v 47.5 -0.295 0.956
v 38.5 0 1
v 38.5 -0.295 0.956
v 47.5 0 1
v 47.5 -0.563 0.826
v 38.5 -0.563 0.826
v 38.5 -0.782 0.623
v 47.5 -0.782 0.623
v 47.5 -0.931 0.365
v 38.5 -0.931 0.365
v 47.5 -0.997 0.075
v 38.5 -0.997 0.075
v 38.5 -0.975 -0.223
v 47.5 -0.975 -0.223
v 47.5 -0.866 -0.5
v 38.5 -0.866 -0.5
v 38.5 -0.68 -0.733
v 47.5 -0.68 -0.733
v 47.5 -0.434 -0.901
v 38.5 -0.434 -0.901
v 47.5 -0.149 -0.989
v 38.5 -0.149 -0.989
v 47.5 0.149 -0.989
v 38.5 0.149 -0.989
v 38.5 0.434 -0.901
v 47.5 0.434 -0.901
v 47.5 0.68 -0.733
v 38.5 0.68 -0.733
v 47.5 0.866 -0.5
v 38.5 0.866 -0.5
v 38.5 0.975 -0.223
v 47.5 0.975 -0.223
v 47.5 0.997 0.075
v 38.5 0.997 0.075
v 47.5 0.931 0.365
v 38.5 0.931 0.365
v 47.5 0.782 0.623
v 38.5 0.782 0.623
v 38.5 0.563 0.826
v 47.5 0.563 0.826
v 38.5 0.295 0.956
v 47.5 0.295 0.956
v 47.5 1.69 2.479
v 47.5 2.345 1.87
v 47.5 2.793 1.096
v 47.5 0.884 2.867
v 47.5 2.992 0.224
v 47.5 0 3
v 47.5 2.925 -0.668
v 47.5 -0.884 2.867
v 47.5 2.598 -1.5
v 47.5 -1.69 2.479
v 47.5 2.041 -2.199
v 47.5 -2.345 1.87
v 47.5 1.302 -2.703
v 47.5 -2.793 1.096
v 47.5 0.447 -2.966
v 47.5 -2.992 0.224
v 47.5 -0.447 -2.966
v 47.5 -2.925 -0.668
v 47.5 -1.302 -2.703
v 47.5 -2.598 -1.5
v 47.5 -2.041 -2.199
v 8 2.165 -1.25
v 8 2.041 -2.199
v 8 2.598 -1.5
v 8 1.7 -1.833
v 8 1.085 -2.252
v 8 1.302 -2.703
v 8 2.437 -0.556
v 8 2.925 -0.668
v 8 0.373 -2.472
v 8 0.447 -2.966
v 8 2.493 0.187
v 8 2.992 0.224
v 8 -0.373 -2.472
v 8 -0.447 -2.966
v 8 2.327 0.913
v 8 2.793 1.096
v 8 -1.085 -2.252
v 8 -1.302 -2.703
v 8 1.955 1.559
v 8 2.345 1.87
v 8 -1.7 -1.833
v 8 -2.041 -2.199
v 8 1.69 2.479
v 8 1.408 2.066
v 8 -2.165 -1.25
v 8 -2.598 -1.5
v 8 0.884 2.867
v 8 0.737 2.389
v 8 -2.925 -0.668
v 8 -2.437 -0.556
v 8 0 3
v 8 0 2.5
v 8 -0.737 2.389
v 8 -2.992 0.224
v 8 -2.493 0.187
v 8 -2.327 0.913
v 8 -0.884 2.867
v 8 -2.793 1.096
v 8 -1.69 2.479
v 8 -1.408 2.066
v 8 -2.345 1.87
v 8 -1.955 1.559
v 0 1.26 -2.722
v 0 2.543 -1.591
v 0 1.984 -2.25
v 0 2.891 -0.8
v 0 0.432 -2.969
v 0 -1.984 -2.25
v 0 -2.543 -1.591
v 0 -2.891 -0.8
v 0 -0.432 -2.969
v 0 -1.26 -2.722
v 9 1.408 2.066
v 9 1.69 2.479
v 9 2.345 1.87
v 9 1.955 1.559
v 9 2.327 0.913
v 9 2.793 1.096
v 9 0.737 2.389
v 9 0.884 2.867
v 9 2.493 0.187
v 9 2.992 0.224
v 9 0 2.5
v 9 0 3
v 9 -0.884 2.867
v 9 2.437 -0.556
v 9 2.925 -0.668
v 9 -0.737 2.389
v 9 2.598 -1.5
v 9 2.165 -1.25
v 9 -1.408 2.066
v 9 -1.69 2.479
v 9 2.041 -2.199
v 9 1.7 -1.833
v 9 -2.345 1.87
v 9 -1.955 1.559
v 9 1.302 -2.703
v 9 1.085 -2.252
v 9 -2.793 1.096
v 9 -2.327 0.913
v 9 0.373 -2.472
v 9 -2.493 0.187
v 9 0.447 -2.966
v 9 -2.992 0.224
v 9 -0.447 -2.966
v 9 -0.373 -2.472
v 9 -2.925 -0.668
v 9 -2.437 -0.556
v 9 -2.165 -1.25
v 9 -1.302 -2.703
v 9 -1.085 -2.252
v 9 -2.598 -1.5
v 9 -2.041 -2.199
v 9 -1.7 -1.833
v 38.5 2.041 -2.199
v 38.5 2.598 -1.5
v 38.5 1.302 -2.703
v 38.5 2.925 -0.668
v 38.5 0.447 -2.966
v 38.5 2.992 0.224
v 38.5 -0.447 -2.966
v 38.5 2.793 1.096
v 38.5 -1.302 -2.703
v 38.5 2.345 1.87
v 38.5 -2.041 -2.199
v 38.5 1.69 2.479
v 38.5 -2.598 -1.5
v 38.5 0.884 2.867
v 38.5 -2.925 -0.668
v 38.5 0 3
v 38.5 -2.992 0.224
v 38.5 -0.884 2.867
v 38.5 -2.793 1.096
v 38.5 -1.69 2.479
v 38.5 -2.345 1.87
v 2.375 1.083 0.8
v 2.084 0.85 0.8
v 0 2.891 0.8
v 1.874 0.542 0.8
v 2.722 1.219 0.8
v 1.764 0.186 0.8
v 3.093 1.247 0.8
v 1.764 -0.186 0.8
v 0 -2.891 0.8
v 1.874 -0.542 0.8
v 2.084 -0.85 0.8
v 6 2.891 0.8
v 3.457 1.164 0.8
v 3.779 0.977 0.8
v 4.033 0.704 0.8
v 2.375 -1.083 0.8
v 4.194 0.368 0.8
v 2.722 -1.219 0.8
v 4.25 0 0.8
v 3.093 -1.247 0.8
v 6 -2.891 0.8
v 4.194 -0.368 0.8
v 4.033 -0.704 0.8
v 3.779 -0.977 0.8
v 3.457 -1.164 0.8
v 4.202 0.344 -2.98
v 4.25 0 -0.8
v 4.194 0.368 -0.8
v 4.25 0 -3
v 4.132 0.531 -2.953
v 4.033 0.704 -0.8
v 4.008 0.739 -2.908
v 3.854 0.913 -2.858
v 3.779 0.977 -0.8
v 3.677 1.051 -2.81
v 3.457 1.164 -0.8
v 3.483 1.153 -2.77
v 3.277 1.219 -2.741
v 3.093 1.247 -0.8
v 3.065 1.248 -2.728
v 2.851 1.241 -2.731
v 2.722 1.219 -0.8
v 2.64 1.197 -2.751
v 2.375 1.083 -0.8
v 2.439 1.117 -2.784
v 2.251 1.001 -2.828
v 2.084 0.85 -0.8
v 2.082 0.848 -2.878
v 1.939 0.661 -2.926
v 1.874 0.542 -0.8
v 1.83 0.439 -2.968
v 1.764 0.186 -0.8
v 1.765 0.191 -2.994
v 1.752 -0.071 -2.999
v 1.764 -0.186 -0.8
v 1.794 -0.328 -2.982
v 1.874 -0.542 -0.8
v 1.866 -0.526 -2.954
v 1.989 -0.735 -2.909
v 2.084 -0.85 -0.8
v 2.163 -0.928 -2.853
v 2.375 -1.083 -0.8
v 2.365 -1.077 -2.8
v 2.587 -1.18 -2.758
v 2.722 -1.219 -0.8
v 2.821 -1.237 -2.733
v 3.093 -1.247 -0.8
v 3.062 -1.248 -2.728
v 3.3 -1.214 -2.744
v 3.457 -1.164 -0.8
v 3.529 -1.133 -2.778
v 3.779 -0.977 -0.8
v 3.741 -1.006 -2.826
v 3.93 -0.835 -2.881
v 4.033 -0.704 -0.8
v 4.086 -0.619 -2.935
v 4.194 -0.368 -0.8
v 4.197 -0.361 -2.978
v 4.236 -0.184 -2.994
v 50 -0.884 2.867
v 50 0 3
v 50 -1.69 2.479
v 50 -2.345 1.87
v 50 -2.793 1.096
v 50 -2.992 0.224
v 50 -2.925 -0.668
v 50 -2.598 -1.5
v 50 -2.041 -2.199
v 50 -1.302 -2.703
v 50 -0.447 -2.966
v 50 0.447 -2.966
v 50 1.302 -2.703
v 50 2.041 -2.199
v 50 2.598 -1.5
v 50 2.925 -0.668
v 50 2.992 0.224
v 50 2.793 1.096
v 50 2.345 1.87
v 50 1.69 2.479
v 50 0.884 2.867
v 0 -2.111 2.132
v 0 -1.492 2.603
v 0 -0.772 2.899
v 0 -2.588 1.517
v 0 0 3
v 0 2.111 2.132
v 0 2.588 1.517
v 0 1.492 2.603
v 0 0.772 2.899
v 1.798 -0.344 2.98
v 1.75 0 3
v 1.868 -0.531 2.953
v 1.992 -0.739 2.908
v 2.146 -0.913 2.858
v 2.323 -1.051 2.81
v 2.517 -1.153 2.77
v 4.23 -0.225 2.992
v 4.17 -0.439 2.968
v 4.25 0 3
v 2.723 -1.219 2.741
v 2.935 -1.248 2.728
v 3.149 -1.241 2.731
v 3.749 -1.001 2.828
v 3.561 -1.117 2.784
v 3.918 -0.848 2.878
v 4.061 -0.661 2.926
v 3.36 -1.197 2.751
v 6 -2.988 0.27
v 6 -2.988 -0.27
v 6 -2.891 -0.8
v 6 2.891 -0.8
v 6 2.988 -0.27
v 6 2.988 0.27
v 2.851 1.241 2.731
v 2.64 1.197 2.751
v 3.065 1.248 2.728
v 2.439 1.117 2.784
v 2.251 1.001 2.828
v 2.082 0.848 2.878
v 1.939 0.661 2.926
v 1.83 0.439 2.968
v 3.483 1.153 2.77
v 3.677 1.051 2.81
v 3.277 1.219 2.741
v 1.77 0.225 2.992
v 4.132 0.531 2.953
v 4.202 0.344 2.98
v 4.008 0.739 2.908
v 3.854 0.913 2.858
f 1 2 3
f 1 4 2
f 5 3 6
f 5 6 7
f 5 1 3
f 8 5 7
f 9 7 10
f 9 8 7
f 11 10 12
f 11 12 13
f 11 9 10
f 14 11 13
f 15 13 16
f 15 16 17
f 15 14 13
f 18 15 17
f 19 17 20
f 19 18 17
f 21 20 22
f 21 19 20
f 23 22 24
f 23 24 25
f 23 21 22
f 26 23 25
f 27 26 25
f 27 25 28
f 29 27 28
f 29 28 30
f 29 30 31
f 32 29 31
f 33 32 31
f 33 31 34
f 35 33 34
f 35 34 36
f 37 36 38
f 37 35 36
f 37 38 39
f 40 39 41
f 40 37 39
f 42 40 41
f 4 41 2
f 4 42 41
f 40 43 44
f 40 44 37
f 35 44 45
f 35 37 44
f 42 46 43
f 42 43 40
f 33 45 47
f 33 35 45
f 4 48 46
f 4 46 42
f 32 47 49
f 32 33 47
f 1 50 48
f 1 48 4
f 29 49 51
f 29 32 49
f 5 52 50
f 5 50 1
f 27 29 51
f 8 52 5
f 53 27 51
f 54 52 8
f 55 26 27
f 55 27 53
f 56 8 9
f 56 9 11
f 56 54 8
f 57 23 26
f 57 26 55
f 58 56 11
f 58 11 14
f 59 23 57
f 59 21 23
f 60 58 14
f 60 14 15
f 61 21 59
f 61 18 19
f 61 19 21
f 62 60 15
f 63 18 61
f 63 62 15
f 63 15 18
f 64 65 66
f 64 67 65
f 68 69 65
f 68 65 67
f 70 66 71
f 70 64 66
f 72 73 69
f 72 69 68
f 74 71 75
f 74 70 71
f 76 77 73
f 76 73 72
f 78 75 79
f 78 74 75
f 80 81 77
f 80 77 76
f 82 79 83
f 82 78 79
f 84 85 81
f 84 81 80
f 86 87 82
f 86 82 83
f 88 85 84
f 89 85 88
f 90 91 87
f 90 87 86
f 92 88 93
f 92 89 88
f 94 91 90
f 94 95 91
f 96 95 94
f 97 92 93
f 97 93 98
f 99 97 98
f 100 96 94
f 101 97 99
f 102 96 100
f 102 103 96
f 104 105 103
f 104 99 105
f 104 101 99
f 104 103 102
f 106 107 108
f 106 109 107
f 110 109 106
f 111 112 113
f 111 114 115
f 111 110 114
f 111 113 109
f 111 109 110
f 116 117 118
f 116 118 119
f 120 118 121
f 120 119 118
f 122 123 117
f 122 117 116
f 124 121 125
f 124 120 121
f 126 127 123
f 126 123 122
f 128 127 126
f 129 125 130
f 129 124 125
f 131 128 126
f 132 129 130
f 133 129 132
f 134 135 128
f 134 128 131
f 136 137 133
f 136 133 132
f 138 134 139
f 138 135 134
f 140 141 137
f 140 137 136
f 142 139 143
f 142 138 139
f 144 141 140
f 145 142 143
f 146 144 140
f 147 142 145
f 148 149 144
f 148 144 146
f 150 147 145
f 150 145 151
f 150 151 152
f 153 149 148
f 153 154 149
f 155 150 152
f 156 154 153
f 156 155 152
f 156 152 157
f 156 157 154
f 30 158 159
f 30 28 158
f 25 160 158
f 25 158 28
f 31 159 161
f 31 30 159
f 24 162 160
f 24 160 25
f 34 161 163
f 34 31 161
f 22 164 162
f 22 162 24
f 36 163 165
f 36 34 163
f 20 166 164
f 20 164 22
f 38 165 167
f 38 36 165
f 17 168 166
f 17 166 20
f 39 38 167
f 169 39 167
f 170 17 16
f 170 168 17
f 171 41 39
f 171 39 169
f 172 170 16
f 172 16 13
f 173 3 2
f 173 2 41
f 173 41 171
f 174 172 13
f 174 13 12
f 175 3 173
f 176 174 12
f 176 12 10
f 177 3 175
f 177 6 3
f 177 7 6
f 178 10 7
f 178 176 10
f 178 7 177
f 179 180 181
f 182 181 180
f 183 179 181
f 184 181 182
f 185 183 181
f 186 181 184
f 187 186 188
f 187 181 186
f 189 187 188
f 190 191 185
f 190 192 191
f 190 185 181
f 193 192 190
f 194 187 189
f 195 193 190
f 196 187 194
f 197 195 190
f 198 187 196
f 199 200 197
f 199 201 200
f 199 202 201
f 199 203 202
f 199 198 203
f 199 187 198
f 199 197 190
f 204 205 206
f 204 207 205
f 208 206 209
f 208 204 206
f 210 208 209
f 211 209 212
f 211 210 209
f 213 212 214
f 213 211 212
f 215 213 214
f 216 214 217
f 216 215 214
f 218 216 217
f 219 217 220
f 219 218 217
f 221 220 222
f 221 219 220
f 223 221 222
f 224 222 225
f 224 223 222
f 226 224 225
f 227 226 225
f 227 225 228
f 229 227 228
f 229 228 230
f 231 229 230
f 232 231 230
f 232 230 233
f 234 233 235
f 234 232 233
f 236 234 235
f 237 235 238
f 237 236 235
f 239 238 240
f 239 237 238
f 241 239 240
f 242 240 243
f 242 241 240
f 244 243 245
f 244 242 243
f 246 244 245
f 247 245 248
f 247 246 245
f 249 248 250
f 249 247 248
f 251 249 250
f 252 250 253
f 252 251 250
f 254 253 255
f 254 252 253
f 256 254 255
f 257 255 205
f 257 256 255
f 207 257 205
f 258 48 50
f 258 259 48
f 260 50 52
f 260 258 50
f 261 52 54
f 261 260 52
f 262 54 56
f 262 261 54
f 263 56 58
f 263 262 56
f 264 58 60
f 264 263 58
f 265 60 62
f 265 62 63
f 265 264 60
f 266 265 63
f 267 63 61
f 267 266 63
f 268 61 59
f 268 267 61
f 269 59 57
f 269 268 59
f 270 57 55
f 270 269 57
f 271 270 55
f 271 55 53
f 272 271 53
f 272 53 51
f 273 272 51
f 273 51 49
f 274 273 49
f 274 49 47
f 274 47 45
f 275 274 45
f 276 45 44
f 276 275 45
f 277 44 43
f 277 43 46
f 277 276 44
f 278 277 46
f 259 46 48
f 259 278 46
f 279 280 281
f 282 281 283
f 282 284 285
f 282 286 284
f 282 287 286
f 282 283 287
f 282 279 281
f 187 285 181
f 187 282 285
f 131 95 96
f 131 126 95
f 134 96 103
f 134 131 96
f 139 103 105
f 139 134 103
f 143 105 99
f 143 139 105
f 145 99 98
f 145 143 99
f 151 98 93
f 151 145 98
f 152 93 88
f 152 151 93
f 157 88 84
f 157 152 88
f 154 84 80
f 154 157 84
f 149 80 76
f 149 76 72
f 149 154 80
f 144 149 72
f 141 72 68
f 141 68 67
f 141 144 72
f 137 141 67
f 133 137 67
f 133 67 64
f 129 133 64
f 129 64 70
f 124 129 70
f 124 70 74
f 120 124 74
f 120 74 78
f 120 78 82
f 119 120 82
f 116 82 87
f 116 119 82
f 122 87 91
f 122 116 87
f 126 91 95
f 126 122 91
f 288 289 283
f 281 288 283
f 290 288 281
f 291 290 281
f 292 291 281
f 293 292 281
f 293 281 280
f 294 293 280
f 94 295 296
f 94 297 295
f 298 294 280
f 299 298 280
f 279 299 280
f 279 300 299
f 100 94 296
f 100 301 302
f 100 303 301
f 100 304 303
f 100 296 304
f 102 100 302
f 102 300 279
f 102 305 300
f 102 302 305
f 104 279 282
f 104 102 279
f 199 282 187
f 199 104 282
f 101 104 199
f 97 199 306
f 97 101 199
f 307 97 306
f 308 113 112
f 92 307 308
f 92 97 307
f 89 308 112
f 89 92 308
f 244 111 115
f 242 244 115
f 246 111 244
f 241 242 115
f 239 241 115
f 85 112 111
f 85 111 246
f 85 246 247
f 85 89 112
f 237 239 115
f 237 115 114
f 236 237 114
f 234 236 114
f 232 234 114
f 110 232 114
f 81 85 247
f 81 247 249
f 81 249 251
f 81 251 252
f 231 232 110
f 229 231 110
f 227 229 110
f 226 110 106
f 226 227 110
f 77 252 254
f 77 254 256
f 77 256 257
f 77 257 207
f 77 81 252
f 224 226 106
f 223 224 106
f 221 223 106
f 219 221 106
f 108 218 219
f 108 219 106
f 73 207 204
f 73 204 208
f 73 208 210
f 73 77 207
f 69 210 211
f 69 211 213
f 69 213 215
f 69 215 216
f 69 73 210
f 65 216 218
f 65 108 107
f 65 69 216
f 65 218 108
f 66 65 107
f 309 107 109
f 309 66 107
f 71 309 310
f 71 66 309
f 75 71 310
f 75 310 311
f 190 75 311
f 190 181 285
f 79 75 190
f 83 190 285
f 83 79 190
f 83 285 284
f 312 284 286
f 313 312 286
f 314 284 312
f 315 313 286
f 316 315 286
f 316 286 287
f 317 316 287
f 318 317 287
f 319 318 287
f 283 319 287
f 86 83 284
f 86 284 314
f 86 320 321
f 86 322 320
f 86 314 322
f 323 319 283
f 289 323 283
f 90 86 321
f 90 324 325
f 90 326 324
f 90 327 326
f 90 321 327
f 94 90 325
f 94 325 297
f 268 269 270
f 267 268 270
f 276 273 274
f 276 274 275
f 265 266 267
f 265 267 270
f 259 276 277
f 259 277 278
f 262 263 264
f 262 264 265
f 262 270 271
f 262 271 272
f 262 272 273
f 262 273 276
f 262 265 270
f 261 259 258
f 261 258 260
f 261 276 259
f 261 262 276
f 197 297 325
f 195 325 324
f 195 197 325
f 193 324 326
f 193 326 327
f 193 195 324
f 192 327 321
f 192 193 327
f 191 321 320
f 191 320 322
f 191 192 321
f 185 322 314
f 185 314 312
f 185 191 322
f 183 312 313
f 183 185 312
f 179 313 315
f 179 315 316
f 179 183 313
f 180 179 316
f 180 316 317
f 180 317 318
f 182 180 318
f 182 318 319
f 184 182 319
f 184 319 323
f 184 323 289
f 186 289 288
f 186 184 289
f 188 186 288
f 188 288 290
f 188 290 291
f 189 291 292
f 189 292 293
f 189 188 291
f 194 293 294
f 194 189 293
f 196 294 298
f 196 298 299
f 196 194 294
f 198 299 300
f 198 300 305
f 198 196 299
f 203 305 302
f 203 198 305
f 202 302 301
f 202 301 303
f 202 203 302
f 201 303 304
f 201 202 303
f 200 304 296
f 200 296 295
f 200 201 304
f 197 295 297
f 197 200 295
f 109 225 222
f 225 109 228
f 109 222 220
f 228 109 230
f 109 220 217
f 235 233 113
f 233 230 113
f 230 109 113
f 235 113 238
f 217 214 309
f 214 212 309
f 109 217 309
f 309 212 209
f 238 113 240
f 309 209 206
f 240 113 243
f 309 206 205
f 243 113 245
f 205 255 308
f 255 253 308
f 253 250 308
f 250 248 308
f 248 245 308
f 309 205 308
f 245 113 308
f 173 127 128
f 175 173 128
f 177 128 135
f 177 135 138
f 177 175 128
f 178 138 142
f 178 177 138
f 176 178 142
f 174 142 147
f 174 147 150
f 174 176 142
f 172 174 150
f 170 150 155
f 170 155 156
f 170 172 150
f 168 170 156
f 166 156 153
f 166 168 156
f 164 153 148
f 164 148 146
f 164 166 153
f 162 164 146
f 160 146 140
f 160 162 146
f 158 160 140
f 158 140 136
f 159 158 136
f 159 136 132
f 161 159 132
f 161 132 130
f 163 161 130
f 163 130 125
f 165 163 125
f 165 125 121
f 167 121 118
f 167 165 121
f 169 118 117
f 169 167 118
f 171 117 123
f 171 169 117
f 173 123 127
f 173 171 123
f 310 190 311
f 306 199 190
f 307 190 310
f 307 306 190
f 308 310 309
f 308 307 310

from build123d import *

# Parameters (mm, degrees)
ENL_V_MAT_EXTRU_5_DEPTH      = 51.179677161
ENL_V_MAT_EXTRU_5_DEPTH_BACK = 51.179677161
ESQUISSE6_R                  = 1.25
ENL_V_MAT_EXTRU_7_DEPTH      = 51.179677173
ENL_V_MAT_EXTRU_7_DEPTH_BACK = 51.179677173
ESQUISSE8_W                  = 6
ESQUISSE8_H                  = 0.8


with BuildPart() as part:
    # Esquisse1 → Révolution3 (revolve)
    with BuildSketch(Plane.XY, mode=Mode.PRIVATE) as r_volution3_sk:
        Polygon((38.5, 3), (38.5, 1), (47.5, 1), (47.5, 3), (50, 3), (50, 0), (0, 0), (0, 3), (8, 3), (8, 2.5), (9, 2.5), (9, 3), align=None)
    revolve(r_volution3_sk.sketch.rotate(Axis((0, 0, 0), (1, 0, 0)), 90), axis=Axis((0, 0, 0), (1, 0, 0)))

    # Esquisse6 → Enlèv. mat.-Extru.5 (cut, two sides: drawn at the far end of the back side and taken through both)
    with BuildSketch(Plane.XY.offset(-ENL_V_MAT_EXTRU_5_DEPTH_BACK)):
        with Locations((3, 0)):
            Circle(ESQUISSE6_R)
    extrude(amount=ENL_V_MAT_EXTRU_5_DEPTH + ENL_V_MAT_EXTRU_5_DEPTH_BACK, mode=Mode.SUBTRACT)

    # Esquisse8 → Enlèv. mat.-Extru.7 (cut, two sides: drawn at the far end of the back side and taken through both)
    with BuildSketch(Plane(origin=(0, 0, 0), x_dir=(1, 0, 0), z_dir=(0, 1, 0)).offset(-ENL_V_MAT_EXTRU_7_DEPTH_BACK)):
        with Locations((3, 0.4)):
            Rectangle(ESQUISSE8_W, ESQUISSE8_H)
        with Locations((3, -0.4)):
            Rectangle(ESQUISSE8_W, ESQUISSE8_H)
    extrude(amount=ENL_V_MAT_EXTRU_7_DEPTH + ENL_V_MAT_EXTRU_7_DEPTH_BACK, mode=Mode.SUBTRACT)


solid = part.part
